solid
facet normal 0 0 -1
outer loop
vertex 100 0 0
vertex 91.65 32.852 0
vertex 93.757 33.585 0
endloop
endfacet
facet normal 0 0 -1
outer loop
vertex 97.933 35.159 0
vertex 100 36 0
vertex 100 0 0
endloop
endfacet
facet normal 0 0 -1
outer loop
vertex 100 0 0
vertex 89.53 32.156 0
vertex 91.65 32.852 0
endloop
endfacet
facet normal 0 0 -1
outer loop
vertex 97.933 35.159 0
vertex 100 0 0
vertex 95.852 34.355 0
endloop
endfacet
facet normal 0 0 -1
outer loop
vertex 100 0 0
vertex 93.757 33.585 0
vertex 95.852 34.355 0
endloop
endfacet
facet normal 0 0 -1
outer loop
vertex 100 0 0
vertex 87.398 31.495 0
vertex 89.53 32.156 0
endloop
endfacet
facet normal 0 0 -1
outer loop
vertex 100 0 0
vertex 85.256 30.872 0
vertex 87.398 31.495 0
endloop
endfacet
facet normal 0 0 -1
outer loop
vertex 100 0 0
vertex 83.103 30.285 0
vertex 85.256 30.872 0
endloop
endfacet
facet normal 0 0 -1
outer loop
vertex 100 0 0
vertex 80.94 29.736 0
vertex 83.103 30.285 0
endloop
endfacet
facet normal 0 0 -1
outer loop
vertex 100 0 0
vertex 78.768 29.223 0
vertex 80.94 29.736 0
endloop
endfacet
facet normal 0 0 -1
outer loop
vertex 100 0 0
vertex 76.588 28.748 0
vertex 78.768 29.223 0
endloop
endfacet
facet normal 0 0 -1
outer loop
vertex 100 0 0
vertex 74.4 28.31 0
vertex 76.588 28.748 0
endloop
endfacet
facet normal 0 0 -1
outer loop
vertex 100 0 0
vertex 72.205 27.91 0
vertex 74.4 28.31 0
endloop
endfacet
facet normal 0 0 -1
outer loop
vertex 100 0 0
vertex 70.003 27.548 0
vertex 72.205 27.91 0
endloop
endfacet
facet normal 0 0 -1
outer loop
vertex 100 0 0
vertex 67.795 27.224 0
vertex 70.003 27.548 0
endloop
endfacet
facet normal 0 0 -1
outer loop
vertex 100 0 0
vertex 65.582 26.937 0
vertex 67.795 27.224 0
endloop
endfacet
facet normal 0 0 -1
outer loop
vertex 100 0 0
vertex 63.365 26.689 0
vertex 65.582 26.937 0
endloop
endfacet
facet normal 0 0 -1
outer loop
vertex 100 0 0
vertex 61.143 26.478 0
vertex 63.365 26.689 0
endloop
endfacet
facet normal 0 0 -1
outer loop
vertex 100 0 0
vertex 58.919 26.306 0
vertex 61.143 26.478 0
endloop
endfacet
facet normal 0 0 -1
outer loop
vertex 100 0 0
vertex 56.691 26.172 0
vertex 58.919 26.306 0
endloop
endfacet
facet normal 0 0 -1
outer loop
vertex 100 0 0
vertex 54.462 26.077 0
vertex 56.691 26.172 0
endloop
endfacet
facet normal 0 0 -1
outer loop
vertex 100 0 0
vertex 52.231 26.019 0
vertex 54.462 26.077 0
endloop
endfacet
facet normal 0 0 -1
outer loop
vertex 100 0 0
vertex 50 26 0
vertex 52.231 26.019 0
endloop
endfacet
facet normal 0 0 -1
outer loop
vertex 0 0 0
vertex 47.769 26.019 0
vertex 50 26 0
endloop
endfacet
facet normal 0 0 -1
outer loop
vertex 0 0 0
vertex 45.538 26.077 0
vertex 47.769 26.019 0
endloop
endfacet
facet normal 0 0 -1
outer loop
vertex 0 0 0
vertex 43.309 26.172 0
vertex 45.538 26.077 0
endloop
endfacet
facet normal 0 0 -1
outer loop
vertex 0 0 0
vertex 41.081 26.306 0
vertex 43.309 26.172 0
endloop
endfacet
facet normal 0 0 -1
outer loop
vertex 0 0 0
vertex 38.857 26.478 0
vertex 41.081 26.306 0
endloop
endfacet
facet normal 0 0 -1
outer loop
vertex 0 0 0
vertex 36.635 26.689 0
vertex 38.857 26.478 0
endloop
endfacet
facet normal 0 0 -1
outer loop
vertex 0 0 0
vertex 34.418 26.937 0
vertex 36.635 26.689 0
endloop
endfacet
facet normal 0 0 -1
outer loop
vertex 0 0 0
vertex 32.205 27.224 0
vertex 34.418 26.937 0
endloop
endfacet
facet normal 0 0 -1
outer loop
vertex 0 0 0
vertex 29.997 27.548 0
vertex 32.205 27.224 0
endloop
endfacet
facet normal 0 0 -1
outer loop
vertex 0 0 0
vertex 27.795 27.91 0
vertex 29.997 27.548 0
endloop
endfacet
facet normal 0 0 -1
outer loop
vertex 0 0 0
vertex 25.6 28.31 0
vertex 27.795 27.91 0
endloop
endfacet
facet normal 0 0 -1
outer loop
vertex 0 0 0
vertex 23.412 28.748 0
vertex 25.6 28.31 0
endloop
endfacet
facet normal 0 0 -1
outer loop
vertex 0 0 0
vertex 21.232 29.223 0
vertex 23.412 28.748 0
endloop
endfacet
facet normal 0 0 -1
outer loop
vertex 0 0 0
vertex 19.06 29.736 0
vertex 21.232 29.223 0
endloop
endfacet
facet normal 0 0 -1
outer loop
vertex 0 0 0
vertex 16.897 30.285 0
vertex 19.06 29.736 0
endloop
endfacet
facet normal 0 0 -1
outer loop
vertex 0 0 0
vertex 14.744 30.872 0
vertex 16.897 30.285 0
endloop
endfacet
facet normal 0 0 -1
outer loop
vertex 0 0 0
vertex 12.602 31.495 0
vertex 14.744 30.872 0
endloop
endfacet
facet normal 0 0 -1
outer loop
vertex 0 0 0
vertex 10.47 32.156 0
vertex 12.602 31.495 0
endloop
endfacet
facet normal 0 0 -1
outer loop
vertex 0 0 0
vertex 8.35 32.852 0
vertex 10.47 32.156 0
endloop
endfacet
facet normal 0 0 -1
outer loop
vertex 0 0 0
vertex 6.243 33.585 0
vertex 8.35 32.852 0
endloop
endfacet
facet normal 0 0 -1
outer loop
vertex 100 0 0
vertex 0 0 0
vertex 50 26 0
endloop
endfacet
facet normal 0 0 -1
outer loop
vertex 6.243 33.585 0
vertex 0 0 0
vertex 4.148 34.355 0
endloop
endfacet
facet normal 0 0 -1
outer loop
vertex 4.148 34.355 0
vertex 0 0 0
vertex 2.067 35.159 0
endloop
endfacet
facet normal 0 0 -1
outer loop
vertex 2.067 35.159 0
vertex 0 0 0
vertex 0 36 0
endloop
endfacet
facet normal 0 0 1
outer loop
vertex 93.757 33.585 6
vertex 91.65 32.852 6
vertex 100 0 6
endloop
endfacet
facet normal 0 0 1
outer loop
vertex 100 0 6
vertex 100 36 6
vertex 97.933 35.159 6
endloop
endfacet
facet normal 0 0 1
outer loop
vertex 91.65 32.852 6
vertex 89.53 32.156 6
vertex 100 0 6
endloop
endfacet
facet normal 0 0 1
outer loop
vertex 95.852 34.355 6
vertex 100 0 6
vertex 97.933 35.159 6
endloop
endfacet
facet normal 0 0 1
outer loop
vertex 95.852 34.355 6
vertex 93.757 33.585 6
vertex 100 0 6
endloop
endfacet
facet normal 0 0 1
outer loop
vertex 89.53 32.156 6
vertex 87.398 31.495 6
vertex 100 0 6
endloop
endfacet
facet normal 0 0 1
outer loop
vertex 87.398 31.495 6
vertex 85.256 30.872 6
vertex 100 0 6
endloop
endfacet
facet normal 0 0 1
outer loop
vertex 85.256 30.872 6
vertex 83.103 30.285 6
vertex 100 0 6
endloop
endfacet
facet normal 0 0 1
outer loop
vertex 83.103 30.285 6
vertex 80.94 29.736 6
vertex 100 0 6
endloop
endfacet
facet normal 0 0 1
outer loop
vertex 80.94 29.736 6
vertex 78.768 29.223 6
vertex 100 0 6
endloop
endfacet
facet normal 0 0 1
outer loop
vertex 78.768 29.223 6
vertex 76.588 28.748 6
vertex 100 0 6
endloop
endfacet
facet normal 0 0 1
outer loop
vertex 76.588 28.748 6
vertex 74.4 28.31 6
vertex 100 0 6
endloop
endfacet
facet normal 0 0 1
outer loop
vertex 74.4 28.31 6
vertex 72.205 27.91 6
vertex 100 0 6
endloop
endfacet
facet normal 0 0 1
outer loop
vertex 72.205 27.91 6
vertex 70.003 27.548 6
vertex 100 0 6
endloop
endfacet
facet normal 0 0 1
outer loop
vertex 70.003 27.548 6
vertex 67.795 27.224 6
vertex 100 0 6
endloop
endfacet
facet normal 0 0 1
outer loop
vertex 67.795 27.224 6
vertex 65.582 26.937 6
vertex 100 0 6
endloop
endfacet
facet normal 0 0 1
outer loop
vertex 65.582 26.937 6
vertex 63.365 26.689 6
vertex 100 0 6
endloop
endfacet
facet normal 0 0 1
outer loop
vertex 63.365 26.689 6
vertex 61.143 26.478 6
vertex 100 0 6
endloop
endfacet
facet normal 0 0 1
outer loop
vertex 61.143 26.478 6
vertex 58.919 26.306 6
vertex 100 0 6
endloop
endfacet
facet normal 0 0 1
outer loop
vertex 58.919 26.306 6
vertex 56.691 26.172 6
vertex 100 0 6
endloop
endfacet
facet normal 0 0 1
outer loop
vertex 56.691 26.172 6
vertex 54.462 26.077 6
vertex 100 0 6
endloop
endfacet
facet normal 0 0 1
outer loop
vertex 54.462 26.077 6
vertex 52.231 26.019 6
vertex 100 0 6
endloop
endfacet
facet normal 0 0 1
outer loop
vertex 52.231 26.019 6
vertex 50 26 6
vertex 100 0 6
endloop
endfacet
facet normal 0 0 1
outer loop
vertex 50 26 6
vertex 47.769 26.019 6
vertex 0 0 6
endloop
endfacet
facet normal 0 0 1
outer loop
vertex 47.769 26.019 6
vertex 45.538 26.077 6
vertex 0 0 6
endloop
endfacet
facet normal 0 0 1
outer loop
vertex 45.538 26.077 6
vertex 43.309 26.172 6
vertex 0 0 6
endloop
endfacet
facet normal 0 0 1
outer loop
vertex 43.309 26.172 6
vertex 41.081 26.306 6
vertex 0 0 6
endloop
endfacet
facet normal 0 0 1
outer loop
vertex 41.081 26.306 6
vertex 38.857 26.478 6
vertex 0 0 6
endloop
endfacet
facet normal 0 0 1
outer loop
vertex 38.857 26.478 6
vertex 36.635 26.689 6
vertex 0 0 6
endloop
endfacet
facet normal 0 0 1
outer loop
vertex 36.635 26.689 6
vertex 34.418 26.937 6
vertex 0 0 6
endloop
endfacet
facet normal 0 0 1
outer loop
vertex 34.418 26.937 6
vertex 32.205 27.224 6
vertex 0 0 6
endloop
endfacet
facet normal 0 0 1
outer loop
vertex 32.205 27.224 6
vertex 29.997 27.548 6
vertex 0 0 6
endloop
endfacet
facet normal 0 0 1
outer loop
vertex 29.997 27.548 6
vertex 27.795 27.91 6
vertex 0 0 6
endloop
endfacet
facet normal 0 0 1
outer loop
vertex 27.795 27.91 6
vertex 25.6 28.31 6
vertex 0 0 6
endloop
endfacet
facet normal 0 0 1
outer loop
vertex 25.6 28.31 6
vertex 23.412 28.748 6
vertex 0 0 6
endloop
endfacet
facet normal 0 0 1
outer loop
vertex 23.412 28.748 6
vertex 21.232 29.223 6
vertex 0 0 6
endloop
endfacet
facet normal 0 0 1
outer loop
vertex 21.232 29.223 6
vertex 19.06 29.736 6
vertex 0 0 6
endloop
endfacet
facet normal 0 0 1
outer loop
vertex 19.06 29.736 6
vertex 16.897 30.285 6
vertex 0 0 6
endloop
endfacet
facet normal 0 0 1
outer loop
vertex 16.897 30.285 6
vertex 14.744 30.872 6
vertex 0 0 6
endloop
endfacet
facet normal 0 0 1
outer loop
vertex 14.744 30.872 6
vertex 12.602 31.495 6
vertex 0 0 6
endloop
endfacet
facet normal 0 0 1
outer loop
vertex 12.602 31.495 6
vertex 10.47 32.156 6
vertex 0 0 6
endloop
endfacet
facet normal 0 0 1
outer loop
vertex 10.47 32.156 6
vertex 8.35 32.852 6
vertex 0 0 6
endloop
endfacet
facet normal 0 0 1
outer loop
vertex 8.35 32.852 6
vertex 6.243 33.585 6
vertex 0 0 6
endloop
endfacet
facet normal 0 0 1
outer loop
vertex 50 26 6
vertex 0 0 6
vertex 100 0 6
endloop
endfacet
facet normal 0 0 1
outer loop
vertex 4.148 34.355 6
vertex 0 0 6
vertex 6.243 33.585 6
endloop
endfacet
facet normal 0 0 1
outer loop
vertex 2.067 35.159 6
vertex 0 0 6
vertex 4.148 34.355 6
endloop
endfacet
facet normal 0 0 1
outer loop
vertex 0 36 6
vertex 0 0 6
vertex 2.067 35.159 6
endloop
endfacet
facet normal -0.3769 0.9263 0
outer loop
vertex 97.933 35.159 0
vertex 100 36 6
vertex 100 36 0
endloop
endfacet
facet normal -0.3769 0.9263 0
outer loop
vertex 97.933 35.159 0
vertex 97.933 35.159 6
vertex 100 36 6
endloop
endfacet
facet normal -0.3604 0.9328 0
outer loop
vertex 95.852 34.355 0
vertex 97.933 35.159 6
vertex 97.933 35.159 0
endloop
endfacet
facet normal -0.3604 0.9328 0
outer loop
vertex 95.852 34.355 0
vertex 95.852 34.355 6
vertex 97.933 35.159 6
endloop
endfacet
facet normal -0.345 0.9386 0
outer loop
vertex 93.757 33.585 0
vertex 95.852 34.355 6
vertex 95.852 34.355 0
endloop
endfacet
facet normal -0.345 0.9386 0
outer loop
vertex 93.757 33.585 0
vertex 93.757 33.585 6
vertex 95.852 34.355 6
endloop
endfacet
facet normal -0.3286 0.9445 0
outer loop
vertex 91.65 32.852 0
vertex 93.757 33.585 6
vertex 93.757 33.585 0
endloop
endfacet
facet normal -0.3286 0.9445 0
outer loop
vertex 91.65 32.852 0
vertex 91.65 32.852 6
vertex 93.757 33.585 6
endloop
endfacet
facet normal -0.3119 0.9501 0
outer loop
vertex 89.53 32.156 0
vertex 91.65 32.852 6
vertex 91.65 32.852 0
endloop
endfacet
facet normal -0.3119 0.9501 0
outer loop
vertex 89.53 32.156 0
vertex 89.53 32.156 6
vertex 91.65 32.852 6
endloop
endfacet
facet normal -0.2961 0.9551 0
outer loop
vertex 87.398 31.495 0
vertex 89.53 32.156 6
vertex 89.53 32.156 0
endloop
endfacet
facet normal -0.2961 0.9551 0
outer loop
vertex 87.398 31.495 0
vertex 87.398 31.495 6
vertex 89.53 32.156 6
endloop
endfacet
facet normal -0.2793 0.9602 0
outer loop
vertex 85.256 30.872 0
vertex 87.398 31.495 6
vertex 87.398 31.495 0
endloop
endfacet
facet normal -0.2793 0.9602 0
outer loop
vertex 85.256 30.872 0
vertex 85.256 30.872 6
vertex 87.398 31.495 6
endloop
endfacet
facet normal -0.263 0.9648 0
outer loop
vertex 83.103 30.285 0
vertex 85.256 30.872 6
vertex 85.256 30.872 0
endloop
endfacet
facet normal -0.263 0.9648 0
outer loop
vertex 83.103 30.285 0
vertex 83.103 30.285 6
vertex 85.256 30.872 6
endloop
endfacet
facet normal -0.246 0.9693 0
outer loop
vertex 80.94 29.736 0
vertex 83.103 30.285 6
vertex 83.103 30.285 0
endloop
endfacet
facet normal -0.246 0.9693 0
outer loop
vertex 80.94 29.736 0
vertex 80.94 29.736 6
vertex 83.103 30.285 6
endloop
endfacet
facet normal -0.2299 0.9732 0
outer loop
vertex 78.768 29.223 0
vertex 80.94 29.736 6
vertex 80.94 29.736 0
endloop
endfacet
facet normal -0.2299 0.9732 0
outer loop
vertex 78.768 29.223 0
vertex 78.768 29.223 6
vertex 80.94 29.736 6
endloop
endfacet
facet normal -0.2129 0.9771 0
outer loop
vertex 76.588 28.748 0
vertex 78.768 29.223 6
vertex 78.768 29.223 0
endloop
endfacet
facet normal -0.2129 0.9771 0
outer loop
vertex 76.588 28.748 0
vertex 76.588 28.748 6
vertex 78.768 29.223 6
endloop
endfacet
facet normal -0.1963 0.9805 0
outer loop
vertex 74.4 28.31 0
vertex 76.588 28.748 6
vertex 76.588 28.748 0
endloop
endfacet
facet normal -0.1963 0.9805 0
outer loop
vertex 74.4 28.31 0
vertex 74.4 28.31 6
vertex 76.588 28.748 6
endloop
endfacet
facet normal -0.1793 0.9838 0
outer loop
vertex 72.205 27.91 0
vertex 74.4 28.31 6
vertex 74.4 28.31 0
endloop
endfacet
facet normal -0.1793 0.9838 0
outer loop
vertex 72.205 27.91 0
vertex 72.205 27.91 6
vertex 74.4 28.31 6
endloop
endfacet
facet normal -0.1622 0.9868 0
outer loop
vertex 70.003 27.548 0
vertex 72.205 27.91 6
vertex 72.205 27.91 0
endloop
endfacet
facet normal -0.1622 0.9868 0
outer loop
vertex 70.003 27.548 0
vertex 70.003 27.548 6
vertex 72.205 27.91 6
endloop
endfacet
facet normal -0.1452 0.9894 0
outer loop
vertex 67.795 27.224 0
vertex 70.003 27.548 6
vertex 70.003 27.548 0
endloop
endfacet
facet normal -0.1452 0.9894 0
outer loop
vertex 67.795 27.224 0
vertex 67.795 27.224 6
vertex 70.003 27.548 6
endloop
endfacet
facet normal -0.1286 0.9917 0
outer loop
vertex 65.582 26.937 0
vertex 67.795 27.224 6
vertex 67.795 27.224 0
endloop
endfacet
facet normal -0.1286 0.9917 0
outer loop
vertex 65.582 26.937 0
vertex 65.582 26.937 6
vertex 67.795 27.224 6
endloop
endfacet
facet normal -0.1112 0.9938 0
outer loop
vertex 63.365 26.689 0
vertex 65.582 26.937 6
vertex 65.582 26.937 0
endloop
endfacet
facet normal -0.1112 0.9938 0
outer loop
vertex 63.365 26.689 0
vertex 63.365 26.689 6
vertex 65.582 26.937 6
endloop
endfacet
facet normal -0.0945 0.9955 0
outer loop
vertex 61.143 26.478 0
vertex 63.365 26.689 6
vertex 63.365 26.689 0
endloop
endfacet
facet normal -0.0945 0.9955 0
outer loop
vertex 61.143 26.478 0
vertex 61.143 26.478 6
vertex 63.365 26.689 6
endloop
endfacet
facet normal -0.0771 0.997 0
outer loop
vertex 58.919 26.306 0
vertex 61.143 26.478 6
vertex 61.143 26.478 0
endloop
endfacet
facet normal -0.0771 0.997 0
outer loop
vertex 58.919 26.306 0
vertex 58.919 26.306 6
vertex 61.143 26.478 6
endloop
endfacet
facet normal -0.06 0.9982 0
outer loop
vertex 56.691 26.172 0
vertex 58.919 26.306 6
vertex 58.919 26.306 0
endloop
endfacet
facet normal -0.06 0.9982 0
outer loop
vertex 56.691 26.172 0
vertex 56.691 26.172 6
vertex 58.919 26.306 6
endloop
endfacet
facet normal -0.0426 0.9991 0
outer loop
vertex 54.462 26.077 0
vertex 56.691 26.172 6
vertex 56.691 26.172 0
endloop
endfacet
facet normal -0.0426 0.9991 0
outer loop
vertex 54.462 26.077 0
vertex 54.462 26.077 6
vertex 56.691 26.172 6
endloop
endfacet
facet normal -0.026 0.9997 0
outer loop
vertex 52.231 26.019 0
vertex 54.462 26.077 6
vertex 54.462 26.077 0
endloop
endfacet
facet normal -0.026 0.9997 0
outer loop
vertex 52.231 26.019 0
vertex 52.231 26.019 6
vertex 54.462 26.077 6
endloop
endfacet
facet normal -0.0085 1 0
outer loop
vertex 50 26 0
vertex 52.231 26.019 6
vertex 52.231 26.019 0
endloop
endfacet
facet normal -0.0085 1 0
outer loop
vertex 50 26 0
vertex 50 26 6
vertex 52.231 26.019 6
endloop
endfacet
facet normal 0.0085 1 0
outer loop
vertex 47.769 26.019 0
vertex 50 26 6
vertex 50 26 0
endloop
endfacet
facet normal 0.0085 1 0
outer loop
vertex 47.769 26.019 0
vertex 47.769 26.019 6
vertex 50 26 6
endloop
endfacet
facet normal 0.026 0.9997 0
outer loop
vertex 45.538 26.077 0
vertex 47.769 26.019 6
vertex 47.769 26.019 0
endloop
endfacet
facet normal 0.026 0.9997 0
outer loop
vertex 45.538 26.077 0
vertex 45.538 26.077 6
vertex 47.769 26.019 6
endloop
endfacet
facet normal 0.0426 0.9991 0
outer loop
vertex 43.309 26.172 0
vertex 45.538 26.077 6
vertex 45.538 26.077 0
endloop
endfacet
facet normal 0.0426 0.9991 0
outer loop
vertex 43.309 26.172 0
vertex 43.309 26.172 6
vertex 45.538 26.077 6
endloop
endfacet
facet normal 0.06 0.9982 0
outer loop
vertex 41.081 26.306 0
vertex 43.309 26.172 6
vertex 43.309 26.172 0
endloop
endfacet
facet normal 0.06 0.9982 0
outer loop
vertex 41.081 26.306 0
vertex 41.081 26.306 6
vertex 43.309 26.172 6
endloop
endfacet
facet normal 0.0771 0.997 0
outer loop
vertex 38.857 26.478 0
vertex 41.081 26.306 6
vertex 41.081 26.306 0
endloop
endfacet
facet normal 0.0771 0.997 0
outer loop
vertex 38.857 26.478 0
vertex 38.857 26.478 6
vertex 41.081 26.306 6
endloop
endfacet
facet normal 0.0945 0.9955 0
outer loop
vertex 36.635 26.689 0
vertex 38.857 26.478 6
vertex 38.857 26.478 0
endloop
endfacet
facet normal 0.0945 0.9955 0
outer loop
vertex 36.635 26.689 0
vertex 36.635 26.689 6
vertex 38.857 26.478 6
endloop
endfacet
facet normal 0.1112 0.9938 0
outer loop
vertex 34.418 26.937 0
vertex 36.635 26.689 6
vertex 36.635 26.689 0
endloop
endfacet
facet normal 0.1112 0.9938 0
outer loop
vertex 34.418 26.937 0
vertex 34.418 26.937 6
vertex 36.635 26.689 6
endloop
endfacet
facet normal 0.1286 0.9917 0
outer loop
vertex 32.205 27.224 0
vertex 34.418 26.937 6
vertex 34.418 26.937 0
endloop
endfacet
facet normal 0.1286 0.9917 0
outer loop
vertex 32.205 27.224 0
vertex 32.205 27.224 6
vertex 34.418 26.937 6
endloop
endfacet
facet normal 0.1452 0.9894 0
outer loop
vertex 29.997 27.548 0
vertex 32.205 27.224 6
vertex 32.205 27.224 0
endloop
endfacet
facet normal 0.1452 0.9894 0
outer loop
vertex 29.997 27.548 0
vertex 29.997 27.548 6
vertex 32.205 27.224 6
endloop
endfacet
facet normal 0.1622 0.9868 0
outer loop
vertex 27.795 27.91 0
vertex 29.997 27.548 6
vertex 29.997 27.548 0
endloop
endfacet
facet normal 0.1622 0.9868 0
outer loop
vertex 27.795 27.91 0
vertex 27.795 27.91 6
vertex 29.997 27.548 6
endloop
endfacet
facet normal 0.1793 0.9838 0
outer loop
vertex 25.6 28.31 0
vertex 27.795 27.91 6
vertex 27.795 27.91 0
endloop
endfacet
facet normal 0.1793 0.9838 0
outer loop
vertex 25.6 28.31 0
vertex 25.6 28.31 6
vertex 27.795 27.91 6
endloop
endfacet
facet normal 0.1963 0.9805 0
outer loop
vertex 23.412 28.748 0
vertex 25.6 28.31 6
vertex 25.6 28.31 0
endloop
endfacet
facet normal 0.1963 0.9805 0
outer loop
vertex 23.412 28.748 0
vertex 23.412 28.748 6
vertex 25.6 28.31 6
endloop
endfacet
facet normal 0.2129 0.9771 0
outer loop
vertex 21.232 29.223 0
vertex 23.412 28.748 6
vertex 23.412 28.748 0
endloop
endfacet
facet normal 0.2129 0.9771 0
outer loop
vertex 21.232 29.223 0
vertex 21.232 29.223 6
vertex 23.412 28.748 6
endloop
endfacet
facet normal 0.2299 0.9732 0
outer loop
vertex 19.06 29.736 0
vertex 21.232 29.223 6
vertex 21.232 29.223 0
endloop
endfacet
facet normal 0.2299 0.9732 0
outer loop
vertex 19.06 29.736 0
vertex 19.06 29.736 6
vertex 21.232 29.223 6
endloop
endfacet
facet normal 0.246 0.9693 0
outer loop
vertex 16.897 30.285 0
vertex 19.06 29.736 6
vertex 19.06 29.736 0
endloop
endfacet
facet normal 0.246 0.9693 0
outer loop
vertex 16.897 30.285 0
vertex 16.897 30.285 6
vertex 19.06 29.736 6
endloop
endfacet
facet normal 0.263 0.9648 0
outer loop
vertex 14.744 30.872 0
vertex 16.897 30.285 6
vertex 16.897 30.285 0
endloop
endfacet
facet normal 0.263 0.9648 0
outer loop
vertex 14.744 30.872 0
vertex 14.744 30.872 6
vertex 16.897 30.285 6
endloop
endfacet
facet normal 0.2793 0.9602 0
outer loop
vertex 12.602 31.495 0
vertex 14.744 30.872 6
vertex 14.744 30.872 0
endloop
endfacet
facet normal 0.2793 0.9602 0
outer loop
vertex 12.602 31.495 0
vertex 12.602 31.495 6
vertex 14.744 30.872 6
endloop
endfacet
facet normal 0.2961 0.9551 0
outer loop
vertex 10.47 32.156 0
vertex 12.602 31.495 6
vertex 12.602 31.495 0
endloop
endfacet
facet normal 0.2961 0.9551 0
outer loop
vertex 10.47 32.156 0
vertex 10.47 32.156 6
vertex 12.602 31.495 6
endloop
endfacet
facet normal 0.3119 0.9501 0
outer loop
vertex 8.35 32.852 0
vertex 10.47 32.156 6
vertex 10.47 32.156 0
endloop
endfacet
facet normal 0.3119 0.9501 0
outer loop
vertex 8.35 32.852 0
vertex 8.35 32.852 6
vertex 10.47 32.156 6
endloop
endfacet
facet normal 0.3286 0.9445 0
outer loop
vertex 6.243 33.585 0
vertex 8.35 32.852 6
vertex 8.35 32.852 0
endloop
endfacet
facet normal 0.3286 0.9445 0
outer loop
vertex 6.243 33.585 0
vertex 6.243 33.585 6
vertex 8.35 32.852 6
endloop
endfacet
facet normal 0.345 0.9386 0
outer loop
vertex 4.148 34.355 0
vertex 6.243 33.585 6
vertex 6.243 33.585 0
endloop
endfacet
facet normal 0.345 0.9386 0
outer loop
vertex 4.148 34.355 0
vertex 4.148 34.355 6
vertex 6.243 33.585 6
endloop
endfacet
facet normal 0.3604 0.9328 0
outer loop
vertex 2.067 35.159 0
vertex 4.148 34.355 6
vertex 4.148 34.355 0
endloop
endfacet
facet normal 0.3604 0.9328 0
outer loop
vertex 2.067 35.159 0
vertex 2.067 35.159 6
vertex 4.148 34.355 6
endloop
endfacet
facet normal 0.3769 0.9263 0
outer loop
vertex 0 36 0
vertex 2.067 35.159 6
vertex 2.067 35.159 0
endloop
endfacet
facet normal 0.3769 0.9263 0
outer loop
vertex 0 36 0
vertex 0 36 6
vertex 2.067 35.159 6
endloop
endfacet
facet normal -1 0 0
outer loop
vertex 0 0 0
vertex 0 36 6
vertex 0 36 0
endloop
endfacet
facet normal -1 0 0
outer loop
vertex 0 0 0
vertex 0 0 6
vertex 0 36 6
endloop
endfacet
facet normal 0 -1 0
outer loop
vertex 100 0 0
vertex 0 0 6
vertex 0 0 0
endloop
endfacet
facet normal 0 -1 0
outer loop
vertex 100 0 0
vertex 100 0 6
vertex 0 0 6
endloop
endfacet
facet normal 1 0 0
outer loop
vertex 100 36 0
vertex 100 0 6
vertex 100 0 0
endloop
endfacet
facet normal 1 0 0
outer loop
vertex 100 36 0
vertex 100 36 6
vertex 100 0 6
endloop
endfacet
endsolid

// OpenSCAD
$fn = 32;

// ----------------------------------------------------------------------
// Arc profile plate: notch, 49 points
// ----------------------------------------------------------------------

// --- parameters (mm) ---
bar_l = 100;              // bar length, X
bar_w = 36;               // bar width, Y
notch_depth = 10;         // depth of the arc notch at mid-span
arc_r = 130;              // radius of the notch arc
arc_angle = 45.24;        // notch arc angle, degrees
arc_step = 1;             // sampling step of the notch arc, degrees
plate_t = 6;              // plate thickness, Z

profile = [[0, 0], [100, 0], [100, 36], [97.933, 35.159], [95.852, 34.355], [93.757, 33.585], [91.65, 32.852], [89.53, 32.156], [87.398, 31.495], [85.256, 30.872], [83.103, 30.285], [80.94, 29.736], [78.768, 29.223], [76.588, 28.748], [74.4, 28.31], [72.205, 27.91], [70.003, 27.548], [67.795, 27.224], [65.582, 26.937], [63.365, 26.689], [61.143, 26.478], [58.919, 26.306], [56.691, 26.172], [54.462, 26.077], [52.231, 26.019], [50, 26], [47.769, 26.019], [45.538, 26.077], [43.309, 26.172], [41.081, 26.306], [38.857, 26.478], [36.635, 26.689], [34.418, 26.937], [32.205, 27.224], [29.997, 27.548], [27.795, 27.91], [25.6, 28.31], [23.412, 28.748], [21.232, 29.223], [19.06, 29.736], [16.897, 30.285], [14.744, 30.872], [12.602, 31.495], [10.47, 32.156], [8.35, 32.852], [6.243, 33.585], [4.148, 34.355], [2.067, 35.159], [0, 36]];  // primary outline, 49 points, counter clockwise

// --- the one profile operation ---
linear_extrude(height = plate_t) polygon(points = profile);
